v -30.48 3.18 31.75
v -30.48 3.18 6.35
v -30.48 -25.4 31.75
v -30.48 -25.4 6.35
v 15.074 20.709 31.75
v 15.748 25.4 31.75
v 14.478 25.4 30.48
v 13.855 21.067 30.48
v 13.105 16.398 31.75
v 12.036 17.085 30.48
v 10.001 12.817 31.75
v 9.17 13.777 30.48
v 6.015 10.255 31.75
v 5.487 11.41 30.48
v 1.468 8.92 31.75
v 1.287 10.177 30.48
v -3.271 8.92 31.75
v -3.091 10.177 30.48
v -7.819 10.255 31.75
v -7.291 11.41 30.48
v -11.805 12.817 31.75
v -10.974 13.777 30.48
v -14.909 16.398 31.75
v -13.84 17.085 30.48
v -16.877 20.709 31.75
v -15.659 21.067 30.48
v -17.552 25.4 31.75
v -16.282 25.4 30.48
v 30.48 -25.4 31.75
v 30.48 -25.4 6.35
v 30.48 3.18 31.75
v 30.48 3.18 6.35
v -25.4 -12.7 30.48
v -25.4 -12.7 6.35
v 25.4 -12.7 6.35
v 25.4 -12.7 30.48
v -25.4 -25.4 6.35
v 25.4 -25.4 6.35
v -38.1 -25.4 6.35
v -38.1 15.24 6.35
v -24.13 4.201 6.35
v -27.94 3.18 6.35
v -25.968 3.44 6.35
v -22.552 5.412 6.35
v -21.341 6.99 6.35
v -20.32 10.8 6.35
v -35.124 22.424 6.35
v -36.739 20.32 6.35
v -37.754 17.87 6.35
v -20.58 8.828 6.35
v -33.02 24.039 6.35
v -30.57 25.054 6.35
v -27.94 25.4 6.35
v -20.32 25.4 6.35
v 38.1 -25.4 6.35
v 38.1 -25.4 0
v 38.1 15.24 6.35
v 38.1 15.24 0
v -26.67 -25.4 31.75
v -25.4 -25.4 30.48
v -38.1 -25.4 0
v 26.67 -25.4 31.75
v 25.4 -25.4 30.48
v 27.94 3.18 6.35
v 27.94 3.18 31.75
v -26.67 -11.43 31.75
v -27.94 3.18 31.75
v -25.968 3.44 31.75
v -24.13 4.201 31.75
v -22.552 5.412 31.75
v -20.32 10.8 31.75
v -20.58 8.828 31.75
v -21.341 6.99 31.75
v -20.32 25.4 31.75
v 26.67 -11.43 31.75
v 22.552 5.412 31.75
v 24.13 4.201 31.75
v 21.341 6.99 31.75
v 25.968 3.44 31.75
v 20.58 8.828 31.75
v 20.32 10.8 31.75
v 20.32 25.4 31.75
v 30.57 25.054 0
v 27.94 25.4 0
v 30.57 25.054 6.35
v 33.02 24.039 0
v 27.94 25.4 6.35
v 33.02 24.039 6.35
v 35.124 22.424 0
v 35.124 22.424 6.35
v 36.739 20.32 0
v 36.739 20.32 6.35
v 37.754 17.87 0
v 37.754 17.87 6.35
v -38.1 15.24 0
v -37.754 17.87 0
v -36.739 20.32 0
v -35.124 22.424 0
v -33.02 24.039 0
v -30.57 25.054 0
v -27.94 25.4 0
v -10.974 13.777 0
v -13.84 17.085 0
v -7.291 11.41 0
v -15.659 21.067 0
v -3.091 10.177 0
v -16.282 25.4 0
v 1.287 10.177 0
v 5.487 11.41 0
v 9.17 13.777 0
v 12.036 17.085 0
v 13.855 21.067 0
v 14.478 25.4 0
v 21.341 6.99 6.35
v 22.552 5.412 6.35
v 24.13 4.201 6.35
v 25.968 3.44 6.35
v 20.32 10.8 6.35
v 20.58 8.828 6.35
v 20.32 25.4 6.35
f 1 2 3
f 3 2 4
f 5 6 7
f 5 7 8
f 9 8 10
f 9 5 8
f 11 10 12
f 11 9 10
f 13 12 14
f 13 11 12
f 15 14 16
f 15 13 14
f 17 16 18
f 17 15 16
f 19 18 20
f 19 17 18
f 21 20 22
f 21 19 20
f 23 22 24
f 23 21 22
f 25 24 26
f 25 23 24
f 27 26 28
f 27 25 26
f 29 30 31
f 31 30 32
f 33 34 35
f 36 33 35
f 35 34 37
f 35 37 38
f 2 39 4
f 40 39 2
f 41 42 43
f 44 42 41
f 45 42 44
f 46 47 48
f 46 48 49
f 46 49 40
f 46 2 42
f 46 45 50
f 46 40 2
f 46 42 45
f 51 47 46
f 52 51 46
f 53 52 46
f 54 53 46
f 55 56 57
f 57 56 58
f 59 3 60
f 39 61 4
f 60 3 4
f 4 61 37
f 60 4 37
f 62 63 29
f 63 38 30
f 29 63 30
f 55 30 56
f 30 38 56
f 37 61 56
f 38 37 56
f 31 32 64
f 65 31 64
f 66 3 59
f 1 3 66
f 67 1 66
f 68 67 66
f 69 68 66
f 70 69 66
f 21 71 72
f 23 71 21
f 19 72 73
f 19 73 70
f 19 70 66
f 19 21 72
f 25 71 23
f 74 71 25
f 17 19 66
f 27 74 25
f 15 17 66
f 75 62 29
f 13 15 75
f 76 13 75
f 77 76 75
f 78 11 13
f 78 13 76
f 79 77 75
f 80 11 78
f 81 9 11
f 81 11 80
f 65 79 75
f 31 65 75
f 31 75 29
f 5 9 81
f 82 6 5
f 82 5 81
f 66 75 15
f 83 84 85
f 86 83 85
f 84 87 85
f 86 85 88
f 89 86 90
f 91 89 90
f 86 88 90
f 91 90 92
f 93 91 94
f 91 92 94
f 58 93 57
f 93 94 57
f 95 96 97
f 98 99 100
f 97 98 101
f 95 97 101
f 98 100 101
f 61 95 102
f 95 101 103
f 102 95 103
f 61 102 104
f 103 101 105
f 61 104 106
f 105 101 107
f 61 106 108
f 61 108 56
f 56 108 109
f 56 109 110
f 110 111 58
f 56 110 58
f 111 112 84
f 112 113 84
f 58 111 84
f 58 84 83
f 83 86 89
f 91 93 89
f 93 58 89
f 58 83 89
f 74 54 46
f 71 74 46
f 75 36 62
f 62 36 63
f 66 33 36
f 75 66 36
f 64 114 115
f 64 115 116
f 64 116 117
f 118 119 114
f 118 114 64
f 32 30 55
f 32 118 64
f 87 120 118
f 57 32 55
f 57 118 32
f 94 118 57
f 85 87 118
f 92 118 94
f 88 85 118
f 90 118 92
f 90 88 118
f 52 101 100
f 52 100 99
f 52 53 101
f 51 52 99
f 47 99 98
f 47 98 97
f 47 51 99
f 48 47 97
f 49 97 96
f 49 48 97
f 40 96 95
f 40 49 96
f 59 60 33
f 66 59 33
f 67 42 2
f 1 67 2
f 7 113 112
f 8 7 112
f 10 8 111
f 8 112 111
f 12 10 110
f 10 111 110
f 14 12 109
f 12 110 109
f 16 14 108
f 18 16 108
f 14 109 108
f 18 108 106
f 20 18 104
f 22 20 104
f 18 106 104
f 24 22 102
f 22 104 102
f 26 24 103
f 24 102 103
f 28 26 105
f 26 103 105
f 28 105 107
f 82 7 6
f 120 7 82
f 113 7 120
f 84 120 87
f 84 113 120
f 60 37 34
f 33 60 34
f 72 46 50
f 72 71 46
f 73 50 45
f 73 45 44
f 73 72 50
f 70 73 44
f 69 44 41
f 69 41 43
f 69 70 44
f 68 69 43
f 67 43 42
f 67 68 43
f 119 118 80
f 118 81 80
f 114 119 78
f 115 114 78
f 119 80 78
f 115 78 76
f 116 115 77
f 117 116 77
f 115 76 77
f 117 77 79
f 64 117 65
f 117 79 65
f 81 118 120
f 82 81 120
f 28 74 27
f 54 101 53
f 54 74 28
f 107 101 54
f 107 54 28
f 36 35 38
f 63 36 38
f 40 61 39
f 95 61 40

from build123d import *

# Parameters (mm, degrees)
F0_W     = 76.2
F0_H     = 50.8
F1_DEPTH = 6.35
F3_DEPTH = 25.4
F5_DEPTH = 31.75
F6_SIZE  = 1.27
F7_R     = 10.16
F8_SIZE  = 1.27
F9_R     = 7.62
F10_R    = 7.62


with BuildPart() as f1:
    # F0 (on Top) → F1 (new body)
    with BuildSketch(Plane.XY):
        Rectangle(F0_W, F0_H)
    extrude(amount=F1_DEPTH)

    # F2 (on face) → F3 (join)
    with BuildSketch(Plane.XY.offset(6.35)):
        Polygon((-25.4, -25.4), (-25.4, -12.7), (-25.4, 3.18004773), (-30.48, 3.18004773), (-30.48, -25.4), align=None)
        Polygon((30.48, 3.18004773), (25.4, 3.18004773), (25.4, -12.7), (25.4, -25.4), (30.48, -25.4), align=None)
        with BuildLine():
            Line((20.32, 3.18004773), (20.32, 25.4))
            Line((20.32, 25.4), (14.478, 25.4))
            ThreePointArc((14.478, 25.4), (-0.9019215927, 10.0200784073), (-16.2818431854, 25.4))
            Line((-16.2818431854, 25.4), (-20.32, 25.4))
            Line((-20.32, 25.4), (-20.32, 3.18004773))
            Line((-20.32, 3.18004773), (-25.4, 3.18004773))
            Line((-25.4, 3.18004773), (-25.4, -12.7))
            Line((-25.4, -12.7), (25.4, -12.7))
            Line((25.4, -12.7), (25.4, 3.18004773))
            Line((25.4, 3.18004773), (20.32, 3.18004773))
        make_face()
    extrude(amount=F3_DEPTH)

    # F4 (on face) → F5 (cut)
    with BuildSketch(Plane.XY.offset(31.75)):
        with BuildLine():
            Line((14.478, 25.4), (-16.2818431854, 25.4))
            ThreePointArc((-16.2818431854, 25.4), (-0.9019215927, 10.0200784073), (14.478, 25.4))
        make_face()
    extrude(amount=-F5_DEPTH, mode=Mode.SUBTRACT)

    # F6
    f6_edges = [f1.edges().sort_by_distance(p)[0] for p in [
        (0, -12.7, 31.75),
        (-25.4, -19.05, 31.75),
        (25.4, -19.05, 31.75),
    ]]
    chamfer(f6_edges, length=F6_SIZE)

    # F7
    f7_edges = [f1.edges().sort_by_distance(p)[0] for p in [
        (-38.1, 25.4, 3.175),
        (38.1, 25.4, 3.175),
    ]]
    fillet(f7_edges, radius=F7_R)

    # F8
    f8_edges = [f1.edges().sort_by_distance(p)[0] for p in [
        (-0.901922, 10.020078, 31.75),
    ]]
    chamfer(f8_edges, length=F8_SIZE)

    # F9
    f9_edges = [f1.edges().sort_by_distance(p)[0] for p in [
        (-20.32, 3.180048, 19.05),
    ]]
    fillet(f9_edges, radius=F9_R)

    # F10
    f10_edges = [f1.edges().sort_by_distance(p)[0] for p in [
        (20.32, 3.180048, 19.05),
    ]]
    fillet(f10_edges, radius=F10_R)


solid = f1.part
